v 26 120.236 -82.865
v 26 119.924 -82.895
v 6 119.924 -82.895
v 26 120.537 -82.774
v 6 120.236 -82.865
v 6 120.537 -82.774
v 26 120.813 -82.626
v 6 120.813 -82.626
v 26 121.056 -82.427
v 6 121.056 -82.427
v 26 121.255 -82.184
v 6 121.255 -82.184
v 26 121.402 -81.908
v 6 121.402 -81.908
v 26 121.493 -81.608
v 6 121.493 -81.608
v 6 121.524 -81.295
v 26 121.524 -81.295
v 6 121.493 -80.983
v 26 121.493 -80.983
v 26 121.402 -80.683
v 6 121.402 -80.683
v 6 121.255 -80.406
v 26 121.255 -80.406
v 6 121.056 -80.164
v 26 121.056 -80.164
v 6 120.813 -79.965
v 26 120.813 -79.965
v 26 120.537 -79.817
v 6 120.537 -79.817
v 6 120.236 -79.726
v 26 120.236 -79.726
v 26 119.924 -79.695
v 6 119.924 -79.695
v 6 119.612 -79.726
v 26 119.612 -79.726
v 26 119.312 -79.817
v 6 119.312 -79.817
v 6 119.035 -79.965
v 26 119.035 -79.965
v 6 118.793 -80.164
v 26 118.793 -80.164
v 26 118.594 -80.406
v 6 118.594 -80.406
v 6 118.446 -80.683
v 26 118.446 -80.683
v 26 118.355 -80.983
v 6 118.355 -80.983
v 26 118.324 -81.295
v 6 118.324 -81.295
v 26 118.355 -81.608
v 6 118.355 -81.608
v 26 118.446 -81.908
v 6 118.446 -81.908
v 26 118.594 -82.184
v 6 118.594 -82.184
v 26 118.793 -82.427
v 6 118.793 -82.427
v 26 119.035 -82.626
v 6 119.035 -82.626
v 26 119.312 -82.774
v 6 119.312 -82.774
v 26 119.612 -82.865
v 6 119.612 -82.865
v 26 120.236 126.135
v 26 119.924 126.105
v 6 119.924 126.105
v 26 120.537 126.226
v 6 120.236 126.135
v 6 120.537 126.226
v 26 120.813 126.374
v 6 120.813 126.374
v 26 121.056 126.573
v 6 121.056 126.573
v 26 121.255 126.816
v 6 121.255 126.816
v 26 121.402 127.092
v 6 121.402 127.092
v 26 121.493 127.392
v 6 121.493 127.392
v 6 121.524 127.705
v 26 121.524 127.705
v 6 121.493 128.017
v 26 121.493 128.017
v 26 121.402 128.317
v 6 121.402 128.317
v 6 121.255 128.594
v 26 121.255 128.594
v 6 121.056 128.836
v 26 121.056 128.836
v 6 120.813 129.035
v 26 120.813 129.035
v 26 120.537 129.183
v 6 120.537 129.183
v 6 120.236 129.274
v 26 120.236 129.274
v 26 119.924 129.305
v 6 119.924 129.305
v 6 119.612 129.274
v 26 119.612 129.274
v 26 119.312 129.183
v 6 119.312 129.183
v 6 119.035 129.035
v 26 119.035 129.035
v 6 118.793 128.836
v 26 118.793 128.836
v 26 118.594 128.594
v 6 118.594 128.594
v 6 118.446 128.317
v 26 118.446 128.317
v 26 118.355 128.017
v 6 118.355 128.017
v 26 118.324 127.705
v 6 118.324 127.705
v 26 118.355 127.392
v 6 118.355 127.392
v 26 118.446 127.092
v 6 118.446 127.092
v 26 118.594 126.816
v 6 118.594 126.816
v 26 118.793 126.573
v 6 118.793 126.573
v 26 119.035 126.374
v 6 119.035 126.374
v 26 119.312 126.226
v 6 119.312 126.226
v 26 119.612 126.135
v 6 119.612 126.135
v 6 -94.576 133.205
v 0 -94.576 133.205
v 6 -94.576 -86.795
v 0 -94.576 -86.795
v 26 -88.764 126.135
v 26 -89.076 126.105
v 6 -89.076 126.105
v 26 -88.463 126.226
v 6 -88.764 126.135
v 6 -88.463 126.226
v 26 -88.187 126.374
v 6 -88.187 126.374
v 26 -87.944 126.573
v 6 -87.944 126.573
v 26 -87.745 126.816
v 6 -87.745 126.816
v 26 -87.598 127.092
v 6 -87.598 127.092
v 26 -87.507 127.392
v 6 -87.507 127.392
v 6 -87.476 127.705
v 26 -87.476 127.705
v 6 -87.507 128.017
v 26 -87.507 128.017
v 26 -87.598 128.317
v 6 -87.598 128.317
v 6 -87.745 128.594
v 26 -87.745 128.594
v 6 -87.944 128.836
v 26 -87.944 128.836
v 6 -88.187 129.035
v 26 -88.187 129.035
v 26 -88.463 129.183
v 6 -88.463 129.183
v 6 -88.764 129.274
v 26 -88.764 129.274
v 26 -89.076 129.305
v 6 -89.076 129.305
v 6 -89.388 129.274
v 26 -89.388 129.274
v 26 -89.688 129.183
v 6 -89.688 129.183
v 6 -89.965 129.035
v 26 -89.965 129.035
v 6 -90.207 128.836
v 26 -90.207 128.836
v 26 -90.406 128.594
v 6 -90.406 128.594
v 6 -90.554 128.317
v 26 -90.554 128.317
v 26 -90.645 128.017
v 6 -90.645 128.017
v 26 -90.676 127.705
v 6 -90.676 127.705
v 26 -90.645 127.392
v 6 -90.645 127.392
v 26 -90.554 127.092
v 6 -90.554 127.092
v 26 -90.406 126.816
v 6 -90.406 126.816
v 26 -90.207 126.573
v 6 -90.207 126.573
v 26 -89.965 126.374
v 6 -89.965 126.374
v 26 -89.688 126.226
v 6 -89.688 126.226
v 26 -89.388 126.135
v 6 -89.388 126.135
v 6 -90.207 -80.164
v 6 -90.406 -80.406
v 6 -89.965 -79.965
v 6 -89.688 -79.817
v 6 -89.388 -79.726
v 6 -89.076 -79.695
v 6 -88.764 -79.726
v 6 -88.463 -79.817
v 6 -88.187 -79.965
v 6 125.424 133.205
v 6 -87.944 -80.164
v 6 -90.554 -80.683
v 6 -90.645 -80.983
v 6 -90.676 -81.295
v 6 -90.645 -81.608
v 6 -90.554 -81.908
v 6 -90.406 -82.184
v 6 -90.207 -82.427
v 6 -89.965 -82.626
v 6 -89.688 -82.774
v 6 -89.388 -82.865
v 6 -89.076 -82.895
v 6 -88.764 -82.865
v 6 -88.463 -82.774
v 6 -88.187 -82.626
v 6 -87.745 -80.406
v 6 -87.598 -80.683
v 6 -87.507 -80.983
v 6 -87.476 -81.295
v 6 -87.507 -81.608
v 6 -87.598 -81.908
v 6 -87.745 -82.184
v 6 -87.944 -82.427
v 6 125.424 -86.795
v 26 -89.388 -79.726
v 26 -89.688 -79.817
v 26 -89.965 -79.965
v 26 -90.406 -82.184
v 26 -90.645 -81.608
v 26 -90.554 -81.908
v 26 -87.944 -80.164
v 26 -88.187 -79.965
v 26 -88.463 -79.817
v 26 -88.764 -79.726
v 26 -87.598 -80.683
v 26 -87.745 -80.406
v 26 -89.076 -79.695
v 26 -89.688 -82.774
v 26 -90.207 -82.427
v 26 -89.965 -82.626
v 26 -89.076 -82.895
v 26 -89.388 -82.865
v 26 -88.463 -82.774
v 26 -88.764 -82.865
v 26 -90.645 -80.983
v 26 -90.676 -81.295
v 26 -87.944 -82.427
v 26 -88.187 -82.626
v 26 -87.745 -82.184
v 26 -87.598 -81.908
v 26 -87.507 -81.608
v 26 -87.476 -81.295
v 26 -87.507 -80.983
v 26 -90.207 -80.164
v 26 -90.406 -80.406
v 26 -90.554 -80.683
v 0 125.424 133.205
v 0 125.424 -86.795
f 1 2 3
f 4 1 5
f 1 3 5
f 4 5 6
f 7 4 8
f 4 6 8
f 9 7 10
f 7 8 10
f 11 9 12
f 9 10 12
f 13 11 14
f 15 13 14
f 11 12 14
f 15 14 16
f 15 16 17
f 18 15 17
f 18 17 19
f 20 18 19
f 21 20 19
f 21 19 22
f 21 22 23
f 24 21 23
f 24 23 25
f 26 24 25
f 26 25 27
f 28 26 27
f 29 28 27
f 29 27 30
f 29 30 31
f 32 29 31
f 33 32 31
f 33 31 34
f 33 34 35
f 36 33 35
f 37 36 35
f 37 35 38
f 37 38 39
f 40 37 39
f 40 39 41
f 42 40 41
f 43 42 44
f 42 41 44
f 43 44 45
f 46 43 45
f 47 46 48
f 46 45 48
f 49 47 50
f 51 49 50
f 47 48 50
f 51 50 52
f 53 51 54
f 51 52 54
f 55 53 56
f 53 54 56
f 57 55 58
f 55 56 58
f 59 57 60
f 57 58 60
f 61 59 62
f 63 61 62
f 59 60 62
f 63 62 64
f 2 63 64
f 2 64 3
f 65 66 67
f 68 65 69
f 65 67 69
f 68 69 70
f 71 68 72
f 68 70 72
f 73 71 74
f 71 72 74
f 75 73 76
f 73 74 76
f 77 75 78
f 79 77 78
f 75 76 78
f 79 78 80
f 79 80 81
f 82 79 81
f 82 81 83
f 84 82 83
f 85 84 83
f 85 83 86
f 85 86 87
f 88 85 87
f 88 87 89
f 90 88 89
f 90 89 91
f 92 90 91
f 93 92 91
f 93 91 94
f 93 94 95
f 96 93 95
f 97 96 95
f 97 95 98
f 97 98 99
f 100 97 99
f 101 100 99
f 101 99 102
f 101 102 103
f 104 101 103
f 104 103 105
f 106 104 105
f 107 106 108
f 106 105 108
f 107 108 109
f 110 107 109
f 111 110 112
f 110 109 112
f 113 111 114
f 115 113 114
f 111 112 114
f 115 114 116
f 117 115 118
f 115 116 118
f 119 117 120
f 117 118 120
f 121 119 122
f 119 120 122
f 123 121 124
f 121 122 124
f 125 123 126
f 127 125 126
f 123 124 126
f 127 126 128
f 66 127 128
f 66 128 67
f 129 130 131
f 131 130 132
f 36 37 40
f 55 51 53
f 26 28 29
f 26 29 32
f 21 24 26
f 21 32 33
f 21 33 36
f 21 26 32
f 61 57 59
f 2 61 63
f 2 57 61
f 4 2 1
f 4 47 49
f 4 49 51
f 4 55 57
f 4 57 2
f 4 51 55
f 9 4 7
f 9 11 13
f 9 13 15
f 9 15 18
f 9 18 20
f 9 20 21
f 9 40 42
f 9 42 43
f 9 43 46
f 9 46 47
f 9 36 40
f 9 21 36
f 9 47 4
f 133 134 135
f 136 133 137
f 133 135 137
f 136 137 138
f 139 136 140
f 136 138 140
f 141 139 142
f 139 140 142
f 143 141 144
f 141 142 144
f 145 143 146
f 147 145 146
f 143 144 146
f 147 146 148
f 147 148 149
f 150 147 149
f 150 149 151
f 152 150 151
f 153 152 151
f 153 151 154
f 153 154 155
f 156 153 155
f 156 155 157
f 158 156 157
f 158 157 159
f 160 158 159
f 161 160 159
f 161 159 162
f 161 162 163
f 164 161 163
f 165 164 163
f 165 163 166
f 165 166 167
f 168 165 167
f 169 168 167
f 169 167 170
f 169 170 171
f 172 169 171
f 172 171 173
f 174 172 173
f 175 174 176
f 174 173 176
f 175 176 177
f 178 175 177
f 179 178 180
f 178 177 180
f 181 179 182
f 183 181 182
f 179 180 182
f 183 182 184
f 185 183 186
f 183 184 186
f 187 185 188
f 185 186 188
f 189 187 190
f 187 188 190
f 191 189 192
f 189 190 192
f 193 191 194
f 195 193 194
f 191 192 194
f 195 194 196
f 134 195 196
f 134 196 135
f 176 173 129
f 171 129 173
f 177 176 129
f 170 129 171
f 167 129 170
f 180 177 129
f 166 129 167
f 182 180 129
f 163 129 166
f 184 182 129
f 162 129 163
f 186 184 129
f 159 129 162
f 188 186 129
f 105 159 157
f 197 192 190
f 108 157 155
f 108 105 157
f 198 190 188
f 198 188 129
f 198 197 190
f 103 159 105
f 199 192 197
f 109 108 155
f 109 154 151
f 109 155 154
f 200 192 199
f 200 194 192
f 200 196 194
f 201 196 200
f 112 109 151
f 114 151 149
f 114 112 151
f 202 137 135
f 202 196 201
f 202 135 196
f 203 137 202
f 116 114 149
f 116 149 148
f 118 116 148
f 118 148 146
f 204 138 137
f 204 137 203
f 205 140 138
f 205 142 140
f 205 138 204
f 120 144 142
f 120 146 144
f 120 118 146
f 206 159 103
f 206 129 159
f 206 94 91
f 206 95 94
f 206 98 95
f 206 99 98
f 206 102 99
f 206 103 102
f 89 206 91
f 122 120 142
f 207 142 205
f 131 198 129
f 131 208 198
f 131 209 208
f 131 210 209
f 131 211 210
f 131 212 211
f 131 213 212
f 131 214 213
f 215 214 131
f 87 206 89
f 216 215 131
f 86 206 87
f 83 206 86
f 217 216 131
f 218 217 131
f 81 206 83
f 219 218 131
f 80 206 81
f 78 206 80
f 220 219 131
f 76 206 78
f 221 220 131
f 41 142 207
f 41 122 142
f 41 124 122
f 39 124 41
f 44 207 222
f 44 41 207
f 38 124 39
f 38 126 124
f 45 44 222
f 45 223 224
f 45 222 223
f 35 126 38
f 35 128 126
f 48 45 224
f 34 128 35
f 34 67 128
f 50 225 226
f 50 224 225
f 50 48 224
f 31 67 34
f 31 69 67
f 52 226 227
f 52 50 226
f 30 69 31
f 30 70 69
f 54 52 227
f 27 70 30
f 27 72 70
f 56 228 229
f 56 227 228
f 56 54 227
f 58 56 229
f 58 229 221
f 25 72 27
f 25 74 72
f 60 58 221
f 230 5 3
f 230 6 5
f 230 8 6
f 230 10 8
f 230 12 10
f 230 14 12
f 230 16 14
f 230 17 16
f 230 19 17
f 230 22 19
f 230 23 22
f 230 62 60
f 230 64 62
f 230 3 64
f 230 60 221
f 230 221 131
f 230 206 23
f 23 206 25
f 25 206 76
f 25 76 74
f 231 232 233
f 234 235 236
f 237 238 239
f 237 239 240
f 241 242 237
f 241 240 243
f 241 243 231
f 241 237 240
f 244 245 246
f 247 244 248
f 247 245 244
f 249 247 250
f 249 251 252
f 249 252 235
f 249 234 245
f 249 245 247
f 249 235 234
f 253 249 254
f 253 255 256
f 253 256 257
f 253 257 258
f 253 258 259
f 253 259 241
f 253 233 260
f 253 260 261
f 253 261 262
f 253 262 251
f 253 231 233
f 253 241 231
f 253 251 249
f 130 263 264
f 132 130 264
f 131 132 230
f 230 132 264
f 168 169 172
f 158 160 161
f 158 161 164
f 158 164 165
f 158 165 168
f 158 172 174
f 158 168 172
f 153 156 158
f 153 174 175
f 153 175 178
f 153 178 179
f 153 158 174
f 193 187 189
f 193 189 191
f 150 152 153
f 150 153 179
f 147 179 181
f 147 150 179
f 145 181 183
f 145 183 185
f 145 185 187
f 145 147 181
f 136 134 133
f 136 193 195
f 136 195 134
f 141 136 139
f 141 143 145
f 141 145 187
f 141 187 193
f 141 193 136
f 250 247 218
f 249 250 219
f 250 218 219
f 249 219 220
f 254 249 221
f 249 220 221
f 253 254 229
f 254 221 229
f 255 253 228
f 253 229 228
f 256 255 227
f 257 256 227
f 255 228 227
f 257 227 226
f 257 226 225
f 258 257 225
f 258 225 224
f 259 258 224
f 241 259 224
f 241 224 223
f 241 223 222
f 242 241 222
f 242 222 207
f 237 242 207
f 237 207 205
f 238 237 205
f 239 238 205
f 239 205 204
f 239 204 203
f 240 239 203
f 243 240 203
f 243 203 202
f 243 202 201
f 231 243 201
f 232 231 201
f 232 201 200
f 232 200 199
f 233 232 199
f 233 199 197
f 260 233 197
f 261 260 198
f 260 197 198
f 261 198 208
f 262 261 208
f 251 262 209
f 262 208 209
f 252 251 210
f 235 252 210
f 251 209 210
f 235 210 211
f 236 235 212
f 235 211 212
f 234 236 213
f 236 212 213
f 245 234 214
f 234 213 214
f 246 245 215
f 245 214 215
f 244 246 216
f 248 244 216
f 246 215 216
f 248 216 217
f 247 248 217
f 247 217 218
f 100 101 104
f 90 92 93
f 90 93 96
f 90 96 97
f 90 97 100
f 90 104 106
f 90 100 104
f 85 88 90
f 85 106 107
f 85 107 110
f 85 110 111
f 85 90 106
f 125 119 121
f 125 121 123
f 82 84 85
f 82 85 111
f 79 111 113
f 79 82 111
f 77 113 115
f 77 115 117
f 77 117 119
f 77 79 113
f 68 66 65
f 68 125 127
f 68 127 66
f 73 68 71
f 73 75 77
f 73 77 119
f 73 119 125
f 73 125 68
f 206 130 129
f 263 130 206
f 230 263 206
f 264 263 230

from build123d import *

# Parameters (mm, degrees)
SKETCH_1_W           = 220
SKETCH_1_H           = 220
SKETCH_1_R           = 1.6
EXTRUDE_1_DEPTH      = 6
EXTRUDE_2_DEPTH      = 20
EXTRUDE_2_DEPTH_BACK = 6
SKETCH_2_R           = 1.6


with BuildPart() as part:
    # 草图1 → 凸台-拉伸1 (new body)
    with BuildSketch(Plane(origin=(0, 0, 0), x_dir=(0, 0, -1), z_dir=(1, 0, 0))):
        with Locations((-23.204600907, 15.424234721)):
            Rectangle(SKETCH_1_W, SKETCH_1_H)
        with Locations((81.295399093, 119.924234721)):
            Circle(SKETCH_1_R, mode=Mode.SUBTRACT)
        with Locations((-127.704600907, 119.924234721)):
            Circle(SKETCH_1_R, mode=Mode.SUBTRACT)
        with Locations((-127.704600907, -89.075765279)):
            Circle(SKETCH_1_R, mode=Mode.SUBTRACT)
        with Locations((81.295399093, -89.075765279)):
            Circle(SKETCH_1_R, mode=Mode.SUBTRACT)
    extrude(amount=EXTRUDE_1_DEPTH)

    # 草图2 → 凸台-拉伸2 (add, two sides: drawn at the far end of the back side and taken through both)
    with BuildSketch(Plane(origin=(6, 0, 0), x_dir=(0, 0, -1), z_dir=(1, 0, 0)).offset(-EXTRUDE_2_DEPTH_BACK)):
        with Locations((81.295399093, -89.075765279)):
            Circle(SKETCH_2_R)
        with Locations((-127.704600907, -89.075765279)):
            Circle(SKETCH_2_R)
        with Locations((81.295399093, 119.924234721)):
            Circle(SKETCH_2_R)
        with Locations((-127.704600907, 119.924234721)):
            Circle(SKETCH_2_R)
    extrude(amount=EXTRUDE_2_DEPTH + EXTRUDE_2_DEPTH_BACK)


solid = part.part
